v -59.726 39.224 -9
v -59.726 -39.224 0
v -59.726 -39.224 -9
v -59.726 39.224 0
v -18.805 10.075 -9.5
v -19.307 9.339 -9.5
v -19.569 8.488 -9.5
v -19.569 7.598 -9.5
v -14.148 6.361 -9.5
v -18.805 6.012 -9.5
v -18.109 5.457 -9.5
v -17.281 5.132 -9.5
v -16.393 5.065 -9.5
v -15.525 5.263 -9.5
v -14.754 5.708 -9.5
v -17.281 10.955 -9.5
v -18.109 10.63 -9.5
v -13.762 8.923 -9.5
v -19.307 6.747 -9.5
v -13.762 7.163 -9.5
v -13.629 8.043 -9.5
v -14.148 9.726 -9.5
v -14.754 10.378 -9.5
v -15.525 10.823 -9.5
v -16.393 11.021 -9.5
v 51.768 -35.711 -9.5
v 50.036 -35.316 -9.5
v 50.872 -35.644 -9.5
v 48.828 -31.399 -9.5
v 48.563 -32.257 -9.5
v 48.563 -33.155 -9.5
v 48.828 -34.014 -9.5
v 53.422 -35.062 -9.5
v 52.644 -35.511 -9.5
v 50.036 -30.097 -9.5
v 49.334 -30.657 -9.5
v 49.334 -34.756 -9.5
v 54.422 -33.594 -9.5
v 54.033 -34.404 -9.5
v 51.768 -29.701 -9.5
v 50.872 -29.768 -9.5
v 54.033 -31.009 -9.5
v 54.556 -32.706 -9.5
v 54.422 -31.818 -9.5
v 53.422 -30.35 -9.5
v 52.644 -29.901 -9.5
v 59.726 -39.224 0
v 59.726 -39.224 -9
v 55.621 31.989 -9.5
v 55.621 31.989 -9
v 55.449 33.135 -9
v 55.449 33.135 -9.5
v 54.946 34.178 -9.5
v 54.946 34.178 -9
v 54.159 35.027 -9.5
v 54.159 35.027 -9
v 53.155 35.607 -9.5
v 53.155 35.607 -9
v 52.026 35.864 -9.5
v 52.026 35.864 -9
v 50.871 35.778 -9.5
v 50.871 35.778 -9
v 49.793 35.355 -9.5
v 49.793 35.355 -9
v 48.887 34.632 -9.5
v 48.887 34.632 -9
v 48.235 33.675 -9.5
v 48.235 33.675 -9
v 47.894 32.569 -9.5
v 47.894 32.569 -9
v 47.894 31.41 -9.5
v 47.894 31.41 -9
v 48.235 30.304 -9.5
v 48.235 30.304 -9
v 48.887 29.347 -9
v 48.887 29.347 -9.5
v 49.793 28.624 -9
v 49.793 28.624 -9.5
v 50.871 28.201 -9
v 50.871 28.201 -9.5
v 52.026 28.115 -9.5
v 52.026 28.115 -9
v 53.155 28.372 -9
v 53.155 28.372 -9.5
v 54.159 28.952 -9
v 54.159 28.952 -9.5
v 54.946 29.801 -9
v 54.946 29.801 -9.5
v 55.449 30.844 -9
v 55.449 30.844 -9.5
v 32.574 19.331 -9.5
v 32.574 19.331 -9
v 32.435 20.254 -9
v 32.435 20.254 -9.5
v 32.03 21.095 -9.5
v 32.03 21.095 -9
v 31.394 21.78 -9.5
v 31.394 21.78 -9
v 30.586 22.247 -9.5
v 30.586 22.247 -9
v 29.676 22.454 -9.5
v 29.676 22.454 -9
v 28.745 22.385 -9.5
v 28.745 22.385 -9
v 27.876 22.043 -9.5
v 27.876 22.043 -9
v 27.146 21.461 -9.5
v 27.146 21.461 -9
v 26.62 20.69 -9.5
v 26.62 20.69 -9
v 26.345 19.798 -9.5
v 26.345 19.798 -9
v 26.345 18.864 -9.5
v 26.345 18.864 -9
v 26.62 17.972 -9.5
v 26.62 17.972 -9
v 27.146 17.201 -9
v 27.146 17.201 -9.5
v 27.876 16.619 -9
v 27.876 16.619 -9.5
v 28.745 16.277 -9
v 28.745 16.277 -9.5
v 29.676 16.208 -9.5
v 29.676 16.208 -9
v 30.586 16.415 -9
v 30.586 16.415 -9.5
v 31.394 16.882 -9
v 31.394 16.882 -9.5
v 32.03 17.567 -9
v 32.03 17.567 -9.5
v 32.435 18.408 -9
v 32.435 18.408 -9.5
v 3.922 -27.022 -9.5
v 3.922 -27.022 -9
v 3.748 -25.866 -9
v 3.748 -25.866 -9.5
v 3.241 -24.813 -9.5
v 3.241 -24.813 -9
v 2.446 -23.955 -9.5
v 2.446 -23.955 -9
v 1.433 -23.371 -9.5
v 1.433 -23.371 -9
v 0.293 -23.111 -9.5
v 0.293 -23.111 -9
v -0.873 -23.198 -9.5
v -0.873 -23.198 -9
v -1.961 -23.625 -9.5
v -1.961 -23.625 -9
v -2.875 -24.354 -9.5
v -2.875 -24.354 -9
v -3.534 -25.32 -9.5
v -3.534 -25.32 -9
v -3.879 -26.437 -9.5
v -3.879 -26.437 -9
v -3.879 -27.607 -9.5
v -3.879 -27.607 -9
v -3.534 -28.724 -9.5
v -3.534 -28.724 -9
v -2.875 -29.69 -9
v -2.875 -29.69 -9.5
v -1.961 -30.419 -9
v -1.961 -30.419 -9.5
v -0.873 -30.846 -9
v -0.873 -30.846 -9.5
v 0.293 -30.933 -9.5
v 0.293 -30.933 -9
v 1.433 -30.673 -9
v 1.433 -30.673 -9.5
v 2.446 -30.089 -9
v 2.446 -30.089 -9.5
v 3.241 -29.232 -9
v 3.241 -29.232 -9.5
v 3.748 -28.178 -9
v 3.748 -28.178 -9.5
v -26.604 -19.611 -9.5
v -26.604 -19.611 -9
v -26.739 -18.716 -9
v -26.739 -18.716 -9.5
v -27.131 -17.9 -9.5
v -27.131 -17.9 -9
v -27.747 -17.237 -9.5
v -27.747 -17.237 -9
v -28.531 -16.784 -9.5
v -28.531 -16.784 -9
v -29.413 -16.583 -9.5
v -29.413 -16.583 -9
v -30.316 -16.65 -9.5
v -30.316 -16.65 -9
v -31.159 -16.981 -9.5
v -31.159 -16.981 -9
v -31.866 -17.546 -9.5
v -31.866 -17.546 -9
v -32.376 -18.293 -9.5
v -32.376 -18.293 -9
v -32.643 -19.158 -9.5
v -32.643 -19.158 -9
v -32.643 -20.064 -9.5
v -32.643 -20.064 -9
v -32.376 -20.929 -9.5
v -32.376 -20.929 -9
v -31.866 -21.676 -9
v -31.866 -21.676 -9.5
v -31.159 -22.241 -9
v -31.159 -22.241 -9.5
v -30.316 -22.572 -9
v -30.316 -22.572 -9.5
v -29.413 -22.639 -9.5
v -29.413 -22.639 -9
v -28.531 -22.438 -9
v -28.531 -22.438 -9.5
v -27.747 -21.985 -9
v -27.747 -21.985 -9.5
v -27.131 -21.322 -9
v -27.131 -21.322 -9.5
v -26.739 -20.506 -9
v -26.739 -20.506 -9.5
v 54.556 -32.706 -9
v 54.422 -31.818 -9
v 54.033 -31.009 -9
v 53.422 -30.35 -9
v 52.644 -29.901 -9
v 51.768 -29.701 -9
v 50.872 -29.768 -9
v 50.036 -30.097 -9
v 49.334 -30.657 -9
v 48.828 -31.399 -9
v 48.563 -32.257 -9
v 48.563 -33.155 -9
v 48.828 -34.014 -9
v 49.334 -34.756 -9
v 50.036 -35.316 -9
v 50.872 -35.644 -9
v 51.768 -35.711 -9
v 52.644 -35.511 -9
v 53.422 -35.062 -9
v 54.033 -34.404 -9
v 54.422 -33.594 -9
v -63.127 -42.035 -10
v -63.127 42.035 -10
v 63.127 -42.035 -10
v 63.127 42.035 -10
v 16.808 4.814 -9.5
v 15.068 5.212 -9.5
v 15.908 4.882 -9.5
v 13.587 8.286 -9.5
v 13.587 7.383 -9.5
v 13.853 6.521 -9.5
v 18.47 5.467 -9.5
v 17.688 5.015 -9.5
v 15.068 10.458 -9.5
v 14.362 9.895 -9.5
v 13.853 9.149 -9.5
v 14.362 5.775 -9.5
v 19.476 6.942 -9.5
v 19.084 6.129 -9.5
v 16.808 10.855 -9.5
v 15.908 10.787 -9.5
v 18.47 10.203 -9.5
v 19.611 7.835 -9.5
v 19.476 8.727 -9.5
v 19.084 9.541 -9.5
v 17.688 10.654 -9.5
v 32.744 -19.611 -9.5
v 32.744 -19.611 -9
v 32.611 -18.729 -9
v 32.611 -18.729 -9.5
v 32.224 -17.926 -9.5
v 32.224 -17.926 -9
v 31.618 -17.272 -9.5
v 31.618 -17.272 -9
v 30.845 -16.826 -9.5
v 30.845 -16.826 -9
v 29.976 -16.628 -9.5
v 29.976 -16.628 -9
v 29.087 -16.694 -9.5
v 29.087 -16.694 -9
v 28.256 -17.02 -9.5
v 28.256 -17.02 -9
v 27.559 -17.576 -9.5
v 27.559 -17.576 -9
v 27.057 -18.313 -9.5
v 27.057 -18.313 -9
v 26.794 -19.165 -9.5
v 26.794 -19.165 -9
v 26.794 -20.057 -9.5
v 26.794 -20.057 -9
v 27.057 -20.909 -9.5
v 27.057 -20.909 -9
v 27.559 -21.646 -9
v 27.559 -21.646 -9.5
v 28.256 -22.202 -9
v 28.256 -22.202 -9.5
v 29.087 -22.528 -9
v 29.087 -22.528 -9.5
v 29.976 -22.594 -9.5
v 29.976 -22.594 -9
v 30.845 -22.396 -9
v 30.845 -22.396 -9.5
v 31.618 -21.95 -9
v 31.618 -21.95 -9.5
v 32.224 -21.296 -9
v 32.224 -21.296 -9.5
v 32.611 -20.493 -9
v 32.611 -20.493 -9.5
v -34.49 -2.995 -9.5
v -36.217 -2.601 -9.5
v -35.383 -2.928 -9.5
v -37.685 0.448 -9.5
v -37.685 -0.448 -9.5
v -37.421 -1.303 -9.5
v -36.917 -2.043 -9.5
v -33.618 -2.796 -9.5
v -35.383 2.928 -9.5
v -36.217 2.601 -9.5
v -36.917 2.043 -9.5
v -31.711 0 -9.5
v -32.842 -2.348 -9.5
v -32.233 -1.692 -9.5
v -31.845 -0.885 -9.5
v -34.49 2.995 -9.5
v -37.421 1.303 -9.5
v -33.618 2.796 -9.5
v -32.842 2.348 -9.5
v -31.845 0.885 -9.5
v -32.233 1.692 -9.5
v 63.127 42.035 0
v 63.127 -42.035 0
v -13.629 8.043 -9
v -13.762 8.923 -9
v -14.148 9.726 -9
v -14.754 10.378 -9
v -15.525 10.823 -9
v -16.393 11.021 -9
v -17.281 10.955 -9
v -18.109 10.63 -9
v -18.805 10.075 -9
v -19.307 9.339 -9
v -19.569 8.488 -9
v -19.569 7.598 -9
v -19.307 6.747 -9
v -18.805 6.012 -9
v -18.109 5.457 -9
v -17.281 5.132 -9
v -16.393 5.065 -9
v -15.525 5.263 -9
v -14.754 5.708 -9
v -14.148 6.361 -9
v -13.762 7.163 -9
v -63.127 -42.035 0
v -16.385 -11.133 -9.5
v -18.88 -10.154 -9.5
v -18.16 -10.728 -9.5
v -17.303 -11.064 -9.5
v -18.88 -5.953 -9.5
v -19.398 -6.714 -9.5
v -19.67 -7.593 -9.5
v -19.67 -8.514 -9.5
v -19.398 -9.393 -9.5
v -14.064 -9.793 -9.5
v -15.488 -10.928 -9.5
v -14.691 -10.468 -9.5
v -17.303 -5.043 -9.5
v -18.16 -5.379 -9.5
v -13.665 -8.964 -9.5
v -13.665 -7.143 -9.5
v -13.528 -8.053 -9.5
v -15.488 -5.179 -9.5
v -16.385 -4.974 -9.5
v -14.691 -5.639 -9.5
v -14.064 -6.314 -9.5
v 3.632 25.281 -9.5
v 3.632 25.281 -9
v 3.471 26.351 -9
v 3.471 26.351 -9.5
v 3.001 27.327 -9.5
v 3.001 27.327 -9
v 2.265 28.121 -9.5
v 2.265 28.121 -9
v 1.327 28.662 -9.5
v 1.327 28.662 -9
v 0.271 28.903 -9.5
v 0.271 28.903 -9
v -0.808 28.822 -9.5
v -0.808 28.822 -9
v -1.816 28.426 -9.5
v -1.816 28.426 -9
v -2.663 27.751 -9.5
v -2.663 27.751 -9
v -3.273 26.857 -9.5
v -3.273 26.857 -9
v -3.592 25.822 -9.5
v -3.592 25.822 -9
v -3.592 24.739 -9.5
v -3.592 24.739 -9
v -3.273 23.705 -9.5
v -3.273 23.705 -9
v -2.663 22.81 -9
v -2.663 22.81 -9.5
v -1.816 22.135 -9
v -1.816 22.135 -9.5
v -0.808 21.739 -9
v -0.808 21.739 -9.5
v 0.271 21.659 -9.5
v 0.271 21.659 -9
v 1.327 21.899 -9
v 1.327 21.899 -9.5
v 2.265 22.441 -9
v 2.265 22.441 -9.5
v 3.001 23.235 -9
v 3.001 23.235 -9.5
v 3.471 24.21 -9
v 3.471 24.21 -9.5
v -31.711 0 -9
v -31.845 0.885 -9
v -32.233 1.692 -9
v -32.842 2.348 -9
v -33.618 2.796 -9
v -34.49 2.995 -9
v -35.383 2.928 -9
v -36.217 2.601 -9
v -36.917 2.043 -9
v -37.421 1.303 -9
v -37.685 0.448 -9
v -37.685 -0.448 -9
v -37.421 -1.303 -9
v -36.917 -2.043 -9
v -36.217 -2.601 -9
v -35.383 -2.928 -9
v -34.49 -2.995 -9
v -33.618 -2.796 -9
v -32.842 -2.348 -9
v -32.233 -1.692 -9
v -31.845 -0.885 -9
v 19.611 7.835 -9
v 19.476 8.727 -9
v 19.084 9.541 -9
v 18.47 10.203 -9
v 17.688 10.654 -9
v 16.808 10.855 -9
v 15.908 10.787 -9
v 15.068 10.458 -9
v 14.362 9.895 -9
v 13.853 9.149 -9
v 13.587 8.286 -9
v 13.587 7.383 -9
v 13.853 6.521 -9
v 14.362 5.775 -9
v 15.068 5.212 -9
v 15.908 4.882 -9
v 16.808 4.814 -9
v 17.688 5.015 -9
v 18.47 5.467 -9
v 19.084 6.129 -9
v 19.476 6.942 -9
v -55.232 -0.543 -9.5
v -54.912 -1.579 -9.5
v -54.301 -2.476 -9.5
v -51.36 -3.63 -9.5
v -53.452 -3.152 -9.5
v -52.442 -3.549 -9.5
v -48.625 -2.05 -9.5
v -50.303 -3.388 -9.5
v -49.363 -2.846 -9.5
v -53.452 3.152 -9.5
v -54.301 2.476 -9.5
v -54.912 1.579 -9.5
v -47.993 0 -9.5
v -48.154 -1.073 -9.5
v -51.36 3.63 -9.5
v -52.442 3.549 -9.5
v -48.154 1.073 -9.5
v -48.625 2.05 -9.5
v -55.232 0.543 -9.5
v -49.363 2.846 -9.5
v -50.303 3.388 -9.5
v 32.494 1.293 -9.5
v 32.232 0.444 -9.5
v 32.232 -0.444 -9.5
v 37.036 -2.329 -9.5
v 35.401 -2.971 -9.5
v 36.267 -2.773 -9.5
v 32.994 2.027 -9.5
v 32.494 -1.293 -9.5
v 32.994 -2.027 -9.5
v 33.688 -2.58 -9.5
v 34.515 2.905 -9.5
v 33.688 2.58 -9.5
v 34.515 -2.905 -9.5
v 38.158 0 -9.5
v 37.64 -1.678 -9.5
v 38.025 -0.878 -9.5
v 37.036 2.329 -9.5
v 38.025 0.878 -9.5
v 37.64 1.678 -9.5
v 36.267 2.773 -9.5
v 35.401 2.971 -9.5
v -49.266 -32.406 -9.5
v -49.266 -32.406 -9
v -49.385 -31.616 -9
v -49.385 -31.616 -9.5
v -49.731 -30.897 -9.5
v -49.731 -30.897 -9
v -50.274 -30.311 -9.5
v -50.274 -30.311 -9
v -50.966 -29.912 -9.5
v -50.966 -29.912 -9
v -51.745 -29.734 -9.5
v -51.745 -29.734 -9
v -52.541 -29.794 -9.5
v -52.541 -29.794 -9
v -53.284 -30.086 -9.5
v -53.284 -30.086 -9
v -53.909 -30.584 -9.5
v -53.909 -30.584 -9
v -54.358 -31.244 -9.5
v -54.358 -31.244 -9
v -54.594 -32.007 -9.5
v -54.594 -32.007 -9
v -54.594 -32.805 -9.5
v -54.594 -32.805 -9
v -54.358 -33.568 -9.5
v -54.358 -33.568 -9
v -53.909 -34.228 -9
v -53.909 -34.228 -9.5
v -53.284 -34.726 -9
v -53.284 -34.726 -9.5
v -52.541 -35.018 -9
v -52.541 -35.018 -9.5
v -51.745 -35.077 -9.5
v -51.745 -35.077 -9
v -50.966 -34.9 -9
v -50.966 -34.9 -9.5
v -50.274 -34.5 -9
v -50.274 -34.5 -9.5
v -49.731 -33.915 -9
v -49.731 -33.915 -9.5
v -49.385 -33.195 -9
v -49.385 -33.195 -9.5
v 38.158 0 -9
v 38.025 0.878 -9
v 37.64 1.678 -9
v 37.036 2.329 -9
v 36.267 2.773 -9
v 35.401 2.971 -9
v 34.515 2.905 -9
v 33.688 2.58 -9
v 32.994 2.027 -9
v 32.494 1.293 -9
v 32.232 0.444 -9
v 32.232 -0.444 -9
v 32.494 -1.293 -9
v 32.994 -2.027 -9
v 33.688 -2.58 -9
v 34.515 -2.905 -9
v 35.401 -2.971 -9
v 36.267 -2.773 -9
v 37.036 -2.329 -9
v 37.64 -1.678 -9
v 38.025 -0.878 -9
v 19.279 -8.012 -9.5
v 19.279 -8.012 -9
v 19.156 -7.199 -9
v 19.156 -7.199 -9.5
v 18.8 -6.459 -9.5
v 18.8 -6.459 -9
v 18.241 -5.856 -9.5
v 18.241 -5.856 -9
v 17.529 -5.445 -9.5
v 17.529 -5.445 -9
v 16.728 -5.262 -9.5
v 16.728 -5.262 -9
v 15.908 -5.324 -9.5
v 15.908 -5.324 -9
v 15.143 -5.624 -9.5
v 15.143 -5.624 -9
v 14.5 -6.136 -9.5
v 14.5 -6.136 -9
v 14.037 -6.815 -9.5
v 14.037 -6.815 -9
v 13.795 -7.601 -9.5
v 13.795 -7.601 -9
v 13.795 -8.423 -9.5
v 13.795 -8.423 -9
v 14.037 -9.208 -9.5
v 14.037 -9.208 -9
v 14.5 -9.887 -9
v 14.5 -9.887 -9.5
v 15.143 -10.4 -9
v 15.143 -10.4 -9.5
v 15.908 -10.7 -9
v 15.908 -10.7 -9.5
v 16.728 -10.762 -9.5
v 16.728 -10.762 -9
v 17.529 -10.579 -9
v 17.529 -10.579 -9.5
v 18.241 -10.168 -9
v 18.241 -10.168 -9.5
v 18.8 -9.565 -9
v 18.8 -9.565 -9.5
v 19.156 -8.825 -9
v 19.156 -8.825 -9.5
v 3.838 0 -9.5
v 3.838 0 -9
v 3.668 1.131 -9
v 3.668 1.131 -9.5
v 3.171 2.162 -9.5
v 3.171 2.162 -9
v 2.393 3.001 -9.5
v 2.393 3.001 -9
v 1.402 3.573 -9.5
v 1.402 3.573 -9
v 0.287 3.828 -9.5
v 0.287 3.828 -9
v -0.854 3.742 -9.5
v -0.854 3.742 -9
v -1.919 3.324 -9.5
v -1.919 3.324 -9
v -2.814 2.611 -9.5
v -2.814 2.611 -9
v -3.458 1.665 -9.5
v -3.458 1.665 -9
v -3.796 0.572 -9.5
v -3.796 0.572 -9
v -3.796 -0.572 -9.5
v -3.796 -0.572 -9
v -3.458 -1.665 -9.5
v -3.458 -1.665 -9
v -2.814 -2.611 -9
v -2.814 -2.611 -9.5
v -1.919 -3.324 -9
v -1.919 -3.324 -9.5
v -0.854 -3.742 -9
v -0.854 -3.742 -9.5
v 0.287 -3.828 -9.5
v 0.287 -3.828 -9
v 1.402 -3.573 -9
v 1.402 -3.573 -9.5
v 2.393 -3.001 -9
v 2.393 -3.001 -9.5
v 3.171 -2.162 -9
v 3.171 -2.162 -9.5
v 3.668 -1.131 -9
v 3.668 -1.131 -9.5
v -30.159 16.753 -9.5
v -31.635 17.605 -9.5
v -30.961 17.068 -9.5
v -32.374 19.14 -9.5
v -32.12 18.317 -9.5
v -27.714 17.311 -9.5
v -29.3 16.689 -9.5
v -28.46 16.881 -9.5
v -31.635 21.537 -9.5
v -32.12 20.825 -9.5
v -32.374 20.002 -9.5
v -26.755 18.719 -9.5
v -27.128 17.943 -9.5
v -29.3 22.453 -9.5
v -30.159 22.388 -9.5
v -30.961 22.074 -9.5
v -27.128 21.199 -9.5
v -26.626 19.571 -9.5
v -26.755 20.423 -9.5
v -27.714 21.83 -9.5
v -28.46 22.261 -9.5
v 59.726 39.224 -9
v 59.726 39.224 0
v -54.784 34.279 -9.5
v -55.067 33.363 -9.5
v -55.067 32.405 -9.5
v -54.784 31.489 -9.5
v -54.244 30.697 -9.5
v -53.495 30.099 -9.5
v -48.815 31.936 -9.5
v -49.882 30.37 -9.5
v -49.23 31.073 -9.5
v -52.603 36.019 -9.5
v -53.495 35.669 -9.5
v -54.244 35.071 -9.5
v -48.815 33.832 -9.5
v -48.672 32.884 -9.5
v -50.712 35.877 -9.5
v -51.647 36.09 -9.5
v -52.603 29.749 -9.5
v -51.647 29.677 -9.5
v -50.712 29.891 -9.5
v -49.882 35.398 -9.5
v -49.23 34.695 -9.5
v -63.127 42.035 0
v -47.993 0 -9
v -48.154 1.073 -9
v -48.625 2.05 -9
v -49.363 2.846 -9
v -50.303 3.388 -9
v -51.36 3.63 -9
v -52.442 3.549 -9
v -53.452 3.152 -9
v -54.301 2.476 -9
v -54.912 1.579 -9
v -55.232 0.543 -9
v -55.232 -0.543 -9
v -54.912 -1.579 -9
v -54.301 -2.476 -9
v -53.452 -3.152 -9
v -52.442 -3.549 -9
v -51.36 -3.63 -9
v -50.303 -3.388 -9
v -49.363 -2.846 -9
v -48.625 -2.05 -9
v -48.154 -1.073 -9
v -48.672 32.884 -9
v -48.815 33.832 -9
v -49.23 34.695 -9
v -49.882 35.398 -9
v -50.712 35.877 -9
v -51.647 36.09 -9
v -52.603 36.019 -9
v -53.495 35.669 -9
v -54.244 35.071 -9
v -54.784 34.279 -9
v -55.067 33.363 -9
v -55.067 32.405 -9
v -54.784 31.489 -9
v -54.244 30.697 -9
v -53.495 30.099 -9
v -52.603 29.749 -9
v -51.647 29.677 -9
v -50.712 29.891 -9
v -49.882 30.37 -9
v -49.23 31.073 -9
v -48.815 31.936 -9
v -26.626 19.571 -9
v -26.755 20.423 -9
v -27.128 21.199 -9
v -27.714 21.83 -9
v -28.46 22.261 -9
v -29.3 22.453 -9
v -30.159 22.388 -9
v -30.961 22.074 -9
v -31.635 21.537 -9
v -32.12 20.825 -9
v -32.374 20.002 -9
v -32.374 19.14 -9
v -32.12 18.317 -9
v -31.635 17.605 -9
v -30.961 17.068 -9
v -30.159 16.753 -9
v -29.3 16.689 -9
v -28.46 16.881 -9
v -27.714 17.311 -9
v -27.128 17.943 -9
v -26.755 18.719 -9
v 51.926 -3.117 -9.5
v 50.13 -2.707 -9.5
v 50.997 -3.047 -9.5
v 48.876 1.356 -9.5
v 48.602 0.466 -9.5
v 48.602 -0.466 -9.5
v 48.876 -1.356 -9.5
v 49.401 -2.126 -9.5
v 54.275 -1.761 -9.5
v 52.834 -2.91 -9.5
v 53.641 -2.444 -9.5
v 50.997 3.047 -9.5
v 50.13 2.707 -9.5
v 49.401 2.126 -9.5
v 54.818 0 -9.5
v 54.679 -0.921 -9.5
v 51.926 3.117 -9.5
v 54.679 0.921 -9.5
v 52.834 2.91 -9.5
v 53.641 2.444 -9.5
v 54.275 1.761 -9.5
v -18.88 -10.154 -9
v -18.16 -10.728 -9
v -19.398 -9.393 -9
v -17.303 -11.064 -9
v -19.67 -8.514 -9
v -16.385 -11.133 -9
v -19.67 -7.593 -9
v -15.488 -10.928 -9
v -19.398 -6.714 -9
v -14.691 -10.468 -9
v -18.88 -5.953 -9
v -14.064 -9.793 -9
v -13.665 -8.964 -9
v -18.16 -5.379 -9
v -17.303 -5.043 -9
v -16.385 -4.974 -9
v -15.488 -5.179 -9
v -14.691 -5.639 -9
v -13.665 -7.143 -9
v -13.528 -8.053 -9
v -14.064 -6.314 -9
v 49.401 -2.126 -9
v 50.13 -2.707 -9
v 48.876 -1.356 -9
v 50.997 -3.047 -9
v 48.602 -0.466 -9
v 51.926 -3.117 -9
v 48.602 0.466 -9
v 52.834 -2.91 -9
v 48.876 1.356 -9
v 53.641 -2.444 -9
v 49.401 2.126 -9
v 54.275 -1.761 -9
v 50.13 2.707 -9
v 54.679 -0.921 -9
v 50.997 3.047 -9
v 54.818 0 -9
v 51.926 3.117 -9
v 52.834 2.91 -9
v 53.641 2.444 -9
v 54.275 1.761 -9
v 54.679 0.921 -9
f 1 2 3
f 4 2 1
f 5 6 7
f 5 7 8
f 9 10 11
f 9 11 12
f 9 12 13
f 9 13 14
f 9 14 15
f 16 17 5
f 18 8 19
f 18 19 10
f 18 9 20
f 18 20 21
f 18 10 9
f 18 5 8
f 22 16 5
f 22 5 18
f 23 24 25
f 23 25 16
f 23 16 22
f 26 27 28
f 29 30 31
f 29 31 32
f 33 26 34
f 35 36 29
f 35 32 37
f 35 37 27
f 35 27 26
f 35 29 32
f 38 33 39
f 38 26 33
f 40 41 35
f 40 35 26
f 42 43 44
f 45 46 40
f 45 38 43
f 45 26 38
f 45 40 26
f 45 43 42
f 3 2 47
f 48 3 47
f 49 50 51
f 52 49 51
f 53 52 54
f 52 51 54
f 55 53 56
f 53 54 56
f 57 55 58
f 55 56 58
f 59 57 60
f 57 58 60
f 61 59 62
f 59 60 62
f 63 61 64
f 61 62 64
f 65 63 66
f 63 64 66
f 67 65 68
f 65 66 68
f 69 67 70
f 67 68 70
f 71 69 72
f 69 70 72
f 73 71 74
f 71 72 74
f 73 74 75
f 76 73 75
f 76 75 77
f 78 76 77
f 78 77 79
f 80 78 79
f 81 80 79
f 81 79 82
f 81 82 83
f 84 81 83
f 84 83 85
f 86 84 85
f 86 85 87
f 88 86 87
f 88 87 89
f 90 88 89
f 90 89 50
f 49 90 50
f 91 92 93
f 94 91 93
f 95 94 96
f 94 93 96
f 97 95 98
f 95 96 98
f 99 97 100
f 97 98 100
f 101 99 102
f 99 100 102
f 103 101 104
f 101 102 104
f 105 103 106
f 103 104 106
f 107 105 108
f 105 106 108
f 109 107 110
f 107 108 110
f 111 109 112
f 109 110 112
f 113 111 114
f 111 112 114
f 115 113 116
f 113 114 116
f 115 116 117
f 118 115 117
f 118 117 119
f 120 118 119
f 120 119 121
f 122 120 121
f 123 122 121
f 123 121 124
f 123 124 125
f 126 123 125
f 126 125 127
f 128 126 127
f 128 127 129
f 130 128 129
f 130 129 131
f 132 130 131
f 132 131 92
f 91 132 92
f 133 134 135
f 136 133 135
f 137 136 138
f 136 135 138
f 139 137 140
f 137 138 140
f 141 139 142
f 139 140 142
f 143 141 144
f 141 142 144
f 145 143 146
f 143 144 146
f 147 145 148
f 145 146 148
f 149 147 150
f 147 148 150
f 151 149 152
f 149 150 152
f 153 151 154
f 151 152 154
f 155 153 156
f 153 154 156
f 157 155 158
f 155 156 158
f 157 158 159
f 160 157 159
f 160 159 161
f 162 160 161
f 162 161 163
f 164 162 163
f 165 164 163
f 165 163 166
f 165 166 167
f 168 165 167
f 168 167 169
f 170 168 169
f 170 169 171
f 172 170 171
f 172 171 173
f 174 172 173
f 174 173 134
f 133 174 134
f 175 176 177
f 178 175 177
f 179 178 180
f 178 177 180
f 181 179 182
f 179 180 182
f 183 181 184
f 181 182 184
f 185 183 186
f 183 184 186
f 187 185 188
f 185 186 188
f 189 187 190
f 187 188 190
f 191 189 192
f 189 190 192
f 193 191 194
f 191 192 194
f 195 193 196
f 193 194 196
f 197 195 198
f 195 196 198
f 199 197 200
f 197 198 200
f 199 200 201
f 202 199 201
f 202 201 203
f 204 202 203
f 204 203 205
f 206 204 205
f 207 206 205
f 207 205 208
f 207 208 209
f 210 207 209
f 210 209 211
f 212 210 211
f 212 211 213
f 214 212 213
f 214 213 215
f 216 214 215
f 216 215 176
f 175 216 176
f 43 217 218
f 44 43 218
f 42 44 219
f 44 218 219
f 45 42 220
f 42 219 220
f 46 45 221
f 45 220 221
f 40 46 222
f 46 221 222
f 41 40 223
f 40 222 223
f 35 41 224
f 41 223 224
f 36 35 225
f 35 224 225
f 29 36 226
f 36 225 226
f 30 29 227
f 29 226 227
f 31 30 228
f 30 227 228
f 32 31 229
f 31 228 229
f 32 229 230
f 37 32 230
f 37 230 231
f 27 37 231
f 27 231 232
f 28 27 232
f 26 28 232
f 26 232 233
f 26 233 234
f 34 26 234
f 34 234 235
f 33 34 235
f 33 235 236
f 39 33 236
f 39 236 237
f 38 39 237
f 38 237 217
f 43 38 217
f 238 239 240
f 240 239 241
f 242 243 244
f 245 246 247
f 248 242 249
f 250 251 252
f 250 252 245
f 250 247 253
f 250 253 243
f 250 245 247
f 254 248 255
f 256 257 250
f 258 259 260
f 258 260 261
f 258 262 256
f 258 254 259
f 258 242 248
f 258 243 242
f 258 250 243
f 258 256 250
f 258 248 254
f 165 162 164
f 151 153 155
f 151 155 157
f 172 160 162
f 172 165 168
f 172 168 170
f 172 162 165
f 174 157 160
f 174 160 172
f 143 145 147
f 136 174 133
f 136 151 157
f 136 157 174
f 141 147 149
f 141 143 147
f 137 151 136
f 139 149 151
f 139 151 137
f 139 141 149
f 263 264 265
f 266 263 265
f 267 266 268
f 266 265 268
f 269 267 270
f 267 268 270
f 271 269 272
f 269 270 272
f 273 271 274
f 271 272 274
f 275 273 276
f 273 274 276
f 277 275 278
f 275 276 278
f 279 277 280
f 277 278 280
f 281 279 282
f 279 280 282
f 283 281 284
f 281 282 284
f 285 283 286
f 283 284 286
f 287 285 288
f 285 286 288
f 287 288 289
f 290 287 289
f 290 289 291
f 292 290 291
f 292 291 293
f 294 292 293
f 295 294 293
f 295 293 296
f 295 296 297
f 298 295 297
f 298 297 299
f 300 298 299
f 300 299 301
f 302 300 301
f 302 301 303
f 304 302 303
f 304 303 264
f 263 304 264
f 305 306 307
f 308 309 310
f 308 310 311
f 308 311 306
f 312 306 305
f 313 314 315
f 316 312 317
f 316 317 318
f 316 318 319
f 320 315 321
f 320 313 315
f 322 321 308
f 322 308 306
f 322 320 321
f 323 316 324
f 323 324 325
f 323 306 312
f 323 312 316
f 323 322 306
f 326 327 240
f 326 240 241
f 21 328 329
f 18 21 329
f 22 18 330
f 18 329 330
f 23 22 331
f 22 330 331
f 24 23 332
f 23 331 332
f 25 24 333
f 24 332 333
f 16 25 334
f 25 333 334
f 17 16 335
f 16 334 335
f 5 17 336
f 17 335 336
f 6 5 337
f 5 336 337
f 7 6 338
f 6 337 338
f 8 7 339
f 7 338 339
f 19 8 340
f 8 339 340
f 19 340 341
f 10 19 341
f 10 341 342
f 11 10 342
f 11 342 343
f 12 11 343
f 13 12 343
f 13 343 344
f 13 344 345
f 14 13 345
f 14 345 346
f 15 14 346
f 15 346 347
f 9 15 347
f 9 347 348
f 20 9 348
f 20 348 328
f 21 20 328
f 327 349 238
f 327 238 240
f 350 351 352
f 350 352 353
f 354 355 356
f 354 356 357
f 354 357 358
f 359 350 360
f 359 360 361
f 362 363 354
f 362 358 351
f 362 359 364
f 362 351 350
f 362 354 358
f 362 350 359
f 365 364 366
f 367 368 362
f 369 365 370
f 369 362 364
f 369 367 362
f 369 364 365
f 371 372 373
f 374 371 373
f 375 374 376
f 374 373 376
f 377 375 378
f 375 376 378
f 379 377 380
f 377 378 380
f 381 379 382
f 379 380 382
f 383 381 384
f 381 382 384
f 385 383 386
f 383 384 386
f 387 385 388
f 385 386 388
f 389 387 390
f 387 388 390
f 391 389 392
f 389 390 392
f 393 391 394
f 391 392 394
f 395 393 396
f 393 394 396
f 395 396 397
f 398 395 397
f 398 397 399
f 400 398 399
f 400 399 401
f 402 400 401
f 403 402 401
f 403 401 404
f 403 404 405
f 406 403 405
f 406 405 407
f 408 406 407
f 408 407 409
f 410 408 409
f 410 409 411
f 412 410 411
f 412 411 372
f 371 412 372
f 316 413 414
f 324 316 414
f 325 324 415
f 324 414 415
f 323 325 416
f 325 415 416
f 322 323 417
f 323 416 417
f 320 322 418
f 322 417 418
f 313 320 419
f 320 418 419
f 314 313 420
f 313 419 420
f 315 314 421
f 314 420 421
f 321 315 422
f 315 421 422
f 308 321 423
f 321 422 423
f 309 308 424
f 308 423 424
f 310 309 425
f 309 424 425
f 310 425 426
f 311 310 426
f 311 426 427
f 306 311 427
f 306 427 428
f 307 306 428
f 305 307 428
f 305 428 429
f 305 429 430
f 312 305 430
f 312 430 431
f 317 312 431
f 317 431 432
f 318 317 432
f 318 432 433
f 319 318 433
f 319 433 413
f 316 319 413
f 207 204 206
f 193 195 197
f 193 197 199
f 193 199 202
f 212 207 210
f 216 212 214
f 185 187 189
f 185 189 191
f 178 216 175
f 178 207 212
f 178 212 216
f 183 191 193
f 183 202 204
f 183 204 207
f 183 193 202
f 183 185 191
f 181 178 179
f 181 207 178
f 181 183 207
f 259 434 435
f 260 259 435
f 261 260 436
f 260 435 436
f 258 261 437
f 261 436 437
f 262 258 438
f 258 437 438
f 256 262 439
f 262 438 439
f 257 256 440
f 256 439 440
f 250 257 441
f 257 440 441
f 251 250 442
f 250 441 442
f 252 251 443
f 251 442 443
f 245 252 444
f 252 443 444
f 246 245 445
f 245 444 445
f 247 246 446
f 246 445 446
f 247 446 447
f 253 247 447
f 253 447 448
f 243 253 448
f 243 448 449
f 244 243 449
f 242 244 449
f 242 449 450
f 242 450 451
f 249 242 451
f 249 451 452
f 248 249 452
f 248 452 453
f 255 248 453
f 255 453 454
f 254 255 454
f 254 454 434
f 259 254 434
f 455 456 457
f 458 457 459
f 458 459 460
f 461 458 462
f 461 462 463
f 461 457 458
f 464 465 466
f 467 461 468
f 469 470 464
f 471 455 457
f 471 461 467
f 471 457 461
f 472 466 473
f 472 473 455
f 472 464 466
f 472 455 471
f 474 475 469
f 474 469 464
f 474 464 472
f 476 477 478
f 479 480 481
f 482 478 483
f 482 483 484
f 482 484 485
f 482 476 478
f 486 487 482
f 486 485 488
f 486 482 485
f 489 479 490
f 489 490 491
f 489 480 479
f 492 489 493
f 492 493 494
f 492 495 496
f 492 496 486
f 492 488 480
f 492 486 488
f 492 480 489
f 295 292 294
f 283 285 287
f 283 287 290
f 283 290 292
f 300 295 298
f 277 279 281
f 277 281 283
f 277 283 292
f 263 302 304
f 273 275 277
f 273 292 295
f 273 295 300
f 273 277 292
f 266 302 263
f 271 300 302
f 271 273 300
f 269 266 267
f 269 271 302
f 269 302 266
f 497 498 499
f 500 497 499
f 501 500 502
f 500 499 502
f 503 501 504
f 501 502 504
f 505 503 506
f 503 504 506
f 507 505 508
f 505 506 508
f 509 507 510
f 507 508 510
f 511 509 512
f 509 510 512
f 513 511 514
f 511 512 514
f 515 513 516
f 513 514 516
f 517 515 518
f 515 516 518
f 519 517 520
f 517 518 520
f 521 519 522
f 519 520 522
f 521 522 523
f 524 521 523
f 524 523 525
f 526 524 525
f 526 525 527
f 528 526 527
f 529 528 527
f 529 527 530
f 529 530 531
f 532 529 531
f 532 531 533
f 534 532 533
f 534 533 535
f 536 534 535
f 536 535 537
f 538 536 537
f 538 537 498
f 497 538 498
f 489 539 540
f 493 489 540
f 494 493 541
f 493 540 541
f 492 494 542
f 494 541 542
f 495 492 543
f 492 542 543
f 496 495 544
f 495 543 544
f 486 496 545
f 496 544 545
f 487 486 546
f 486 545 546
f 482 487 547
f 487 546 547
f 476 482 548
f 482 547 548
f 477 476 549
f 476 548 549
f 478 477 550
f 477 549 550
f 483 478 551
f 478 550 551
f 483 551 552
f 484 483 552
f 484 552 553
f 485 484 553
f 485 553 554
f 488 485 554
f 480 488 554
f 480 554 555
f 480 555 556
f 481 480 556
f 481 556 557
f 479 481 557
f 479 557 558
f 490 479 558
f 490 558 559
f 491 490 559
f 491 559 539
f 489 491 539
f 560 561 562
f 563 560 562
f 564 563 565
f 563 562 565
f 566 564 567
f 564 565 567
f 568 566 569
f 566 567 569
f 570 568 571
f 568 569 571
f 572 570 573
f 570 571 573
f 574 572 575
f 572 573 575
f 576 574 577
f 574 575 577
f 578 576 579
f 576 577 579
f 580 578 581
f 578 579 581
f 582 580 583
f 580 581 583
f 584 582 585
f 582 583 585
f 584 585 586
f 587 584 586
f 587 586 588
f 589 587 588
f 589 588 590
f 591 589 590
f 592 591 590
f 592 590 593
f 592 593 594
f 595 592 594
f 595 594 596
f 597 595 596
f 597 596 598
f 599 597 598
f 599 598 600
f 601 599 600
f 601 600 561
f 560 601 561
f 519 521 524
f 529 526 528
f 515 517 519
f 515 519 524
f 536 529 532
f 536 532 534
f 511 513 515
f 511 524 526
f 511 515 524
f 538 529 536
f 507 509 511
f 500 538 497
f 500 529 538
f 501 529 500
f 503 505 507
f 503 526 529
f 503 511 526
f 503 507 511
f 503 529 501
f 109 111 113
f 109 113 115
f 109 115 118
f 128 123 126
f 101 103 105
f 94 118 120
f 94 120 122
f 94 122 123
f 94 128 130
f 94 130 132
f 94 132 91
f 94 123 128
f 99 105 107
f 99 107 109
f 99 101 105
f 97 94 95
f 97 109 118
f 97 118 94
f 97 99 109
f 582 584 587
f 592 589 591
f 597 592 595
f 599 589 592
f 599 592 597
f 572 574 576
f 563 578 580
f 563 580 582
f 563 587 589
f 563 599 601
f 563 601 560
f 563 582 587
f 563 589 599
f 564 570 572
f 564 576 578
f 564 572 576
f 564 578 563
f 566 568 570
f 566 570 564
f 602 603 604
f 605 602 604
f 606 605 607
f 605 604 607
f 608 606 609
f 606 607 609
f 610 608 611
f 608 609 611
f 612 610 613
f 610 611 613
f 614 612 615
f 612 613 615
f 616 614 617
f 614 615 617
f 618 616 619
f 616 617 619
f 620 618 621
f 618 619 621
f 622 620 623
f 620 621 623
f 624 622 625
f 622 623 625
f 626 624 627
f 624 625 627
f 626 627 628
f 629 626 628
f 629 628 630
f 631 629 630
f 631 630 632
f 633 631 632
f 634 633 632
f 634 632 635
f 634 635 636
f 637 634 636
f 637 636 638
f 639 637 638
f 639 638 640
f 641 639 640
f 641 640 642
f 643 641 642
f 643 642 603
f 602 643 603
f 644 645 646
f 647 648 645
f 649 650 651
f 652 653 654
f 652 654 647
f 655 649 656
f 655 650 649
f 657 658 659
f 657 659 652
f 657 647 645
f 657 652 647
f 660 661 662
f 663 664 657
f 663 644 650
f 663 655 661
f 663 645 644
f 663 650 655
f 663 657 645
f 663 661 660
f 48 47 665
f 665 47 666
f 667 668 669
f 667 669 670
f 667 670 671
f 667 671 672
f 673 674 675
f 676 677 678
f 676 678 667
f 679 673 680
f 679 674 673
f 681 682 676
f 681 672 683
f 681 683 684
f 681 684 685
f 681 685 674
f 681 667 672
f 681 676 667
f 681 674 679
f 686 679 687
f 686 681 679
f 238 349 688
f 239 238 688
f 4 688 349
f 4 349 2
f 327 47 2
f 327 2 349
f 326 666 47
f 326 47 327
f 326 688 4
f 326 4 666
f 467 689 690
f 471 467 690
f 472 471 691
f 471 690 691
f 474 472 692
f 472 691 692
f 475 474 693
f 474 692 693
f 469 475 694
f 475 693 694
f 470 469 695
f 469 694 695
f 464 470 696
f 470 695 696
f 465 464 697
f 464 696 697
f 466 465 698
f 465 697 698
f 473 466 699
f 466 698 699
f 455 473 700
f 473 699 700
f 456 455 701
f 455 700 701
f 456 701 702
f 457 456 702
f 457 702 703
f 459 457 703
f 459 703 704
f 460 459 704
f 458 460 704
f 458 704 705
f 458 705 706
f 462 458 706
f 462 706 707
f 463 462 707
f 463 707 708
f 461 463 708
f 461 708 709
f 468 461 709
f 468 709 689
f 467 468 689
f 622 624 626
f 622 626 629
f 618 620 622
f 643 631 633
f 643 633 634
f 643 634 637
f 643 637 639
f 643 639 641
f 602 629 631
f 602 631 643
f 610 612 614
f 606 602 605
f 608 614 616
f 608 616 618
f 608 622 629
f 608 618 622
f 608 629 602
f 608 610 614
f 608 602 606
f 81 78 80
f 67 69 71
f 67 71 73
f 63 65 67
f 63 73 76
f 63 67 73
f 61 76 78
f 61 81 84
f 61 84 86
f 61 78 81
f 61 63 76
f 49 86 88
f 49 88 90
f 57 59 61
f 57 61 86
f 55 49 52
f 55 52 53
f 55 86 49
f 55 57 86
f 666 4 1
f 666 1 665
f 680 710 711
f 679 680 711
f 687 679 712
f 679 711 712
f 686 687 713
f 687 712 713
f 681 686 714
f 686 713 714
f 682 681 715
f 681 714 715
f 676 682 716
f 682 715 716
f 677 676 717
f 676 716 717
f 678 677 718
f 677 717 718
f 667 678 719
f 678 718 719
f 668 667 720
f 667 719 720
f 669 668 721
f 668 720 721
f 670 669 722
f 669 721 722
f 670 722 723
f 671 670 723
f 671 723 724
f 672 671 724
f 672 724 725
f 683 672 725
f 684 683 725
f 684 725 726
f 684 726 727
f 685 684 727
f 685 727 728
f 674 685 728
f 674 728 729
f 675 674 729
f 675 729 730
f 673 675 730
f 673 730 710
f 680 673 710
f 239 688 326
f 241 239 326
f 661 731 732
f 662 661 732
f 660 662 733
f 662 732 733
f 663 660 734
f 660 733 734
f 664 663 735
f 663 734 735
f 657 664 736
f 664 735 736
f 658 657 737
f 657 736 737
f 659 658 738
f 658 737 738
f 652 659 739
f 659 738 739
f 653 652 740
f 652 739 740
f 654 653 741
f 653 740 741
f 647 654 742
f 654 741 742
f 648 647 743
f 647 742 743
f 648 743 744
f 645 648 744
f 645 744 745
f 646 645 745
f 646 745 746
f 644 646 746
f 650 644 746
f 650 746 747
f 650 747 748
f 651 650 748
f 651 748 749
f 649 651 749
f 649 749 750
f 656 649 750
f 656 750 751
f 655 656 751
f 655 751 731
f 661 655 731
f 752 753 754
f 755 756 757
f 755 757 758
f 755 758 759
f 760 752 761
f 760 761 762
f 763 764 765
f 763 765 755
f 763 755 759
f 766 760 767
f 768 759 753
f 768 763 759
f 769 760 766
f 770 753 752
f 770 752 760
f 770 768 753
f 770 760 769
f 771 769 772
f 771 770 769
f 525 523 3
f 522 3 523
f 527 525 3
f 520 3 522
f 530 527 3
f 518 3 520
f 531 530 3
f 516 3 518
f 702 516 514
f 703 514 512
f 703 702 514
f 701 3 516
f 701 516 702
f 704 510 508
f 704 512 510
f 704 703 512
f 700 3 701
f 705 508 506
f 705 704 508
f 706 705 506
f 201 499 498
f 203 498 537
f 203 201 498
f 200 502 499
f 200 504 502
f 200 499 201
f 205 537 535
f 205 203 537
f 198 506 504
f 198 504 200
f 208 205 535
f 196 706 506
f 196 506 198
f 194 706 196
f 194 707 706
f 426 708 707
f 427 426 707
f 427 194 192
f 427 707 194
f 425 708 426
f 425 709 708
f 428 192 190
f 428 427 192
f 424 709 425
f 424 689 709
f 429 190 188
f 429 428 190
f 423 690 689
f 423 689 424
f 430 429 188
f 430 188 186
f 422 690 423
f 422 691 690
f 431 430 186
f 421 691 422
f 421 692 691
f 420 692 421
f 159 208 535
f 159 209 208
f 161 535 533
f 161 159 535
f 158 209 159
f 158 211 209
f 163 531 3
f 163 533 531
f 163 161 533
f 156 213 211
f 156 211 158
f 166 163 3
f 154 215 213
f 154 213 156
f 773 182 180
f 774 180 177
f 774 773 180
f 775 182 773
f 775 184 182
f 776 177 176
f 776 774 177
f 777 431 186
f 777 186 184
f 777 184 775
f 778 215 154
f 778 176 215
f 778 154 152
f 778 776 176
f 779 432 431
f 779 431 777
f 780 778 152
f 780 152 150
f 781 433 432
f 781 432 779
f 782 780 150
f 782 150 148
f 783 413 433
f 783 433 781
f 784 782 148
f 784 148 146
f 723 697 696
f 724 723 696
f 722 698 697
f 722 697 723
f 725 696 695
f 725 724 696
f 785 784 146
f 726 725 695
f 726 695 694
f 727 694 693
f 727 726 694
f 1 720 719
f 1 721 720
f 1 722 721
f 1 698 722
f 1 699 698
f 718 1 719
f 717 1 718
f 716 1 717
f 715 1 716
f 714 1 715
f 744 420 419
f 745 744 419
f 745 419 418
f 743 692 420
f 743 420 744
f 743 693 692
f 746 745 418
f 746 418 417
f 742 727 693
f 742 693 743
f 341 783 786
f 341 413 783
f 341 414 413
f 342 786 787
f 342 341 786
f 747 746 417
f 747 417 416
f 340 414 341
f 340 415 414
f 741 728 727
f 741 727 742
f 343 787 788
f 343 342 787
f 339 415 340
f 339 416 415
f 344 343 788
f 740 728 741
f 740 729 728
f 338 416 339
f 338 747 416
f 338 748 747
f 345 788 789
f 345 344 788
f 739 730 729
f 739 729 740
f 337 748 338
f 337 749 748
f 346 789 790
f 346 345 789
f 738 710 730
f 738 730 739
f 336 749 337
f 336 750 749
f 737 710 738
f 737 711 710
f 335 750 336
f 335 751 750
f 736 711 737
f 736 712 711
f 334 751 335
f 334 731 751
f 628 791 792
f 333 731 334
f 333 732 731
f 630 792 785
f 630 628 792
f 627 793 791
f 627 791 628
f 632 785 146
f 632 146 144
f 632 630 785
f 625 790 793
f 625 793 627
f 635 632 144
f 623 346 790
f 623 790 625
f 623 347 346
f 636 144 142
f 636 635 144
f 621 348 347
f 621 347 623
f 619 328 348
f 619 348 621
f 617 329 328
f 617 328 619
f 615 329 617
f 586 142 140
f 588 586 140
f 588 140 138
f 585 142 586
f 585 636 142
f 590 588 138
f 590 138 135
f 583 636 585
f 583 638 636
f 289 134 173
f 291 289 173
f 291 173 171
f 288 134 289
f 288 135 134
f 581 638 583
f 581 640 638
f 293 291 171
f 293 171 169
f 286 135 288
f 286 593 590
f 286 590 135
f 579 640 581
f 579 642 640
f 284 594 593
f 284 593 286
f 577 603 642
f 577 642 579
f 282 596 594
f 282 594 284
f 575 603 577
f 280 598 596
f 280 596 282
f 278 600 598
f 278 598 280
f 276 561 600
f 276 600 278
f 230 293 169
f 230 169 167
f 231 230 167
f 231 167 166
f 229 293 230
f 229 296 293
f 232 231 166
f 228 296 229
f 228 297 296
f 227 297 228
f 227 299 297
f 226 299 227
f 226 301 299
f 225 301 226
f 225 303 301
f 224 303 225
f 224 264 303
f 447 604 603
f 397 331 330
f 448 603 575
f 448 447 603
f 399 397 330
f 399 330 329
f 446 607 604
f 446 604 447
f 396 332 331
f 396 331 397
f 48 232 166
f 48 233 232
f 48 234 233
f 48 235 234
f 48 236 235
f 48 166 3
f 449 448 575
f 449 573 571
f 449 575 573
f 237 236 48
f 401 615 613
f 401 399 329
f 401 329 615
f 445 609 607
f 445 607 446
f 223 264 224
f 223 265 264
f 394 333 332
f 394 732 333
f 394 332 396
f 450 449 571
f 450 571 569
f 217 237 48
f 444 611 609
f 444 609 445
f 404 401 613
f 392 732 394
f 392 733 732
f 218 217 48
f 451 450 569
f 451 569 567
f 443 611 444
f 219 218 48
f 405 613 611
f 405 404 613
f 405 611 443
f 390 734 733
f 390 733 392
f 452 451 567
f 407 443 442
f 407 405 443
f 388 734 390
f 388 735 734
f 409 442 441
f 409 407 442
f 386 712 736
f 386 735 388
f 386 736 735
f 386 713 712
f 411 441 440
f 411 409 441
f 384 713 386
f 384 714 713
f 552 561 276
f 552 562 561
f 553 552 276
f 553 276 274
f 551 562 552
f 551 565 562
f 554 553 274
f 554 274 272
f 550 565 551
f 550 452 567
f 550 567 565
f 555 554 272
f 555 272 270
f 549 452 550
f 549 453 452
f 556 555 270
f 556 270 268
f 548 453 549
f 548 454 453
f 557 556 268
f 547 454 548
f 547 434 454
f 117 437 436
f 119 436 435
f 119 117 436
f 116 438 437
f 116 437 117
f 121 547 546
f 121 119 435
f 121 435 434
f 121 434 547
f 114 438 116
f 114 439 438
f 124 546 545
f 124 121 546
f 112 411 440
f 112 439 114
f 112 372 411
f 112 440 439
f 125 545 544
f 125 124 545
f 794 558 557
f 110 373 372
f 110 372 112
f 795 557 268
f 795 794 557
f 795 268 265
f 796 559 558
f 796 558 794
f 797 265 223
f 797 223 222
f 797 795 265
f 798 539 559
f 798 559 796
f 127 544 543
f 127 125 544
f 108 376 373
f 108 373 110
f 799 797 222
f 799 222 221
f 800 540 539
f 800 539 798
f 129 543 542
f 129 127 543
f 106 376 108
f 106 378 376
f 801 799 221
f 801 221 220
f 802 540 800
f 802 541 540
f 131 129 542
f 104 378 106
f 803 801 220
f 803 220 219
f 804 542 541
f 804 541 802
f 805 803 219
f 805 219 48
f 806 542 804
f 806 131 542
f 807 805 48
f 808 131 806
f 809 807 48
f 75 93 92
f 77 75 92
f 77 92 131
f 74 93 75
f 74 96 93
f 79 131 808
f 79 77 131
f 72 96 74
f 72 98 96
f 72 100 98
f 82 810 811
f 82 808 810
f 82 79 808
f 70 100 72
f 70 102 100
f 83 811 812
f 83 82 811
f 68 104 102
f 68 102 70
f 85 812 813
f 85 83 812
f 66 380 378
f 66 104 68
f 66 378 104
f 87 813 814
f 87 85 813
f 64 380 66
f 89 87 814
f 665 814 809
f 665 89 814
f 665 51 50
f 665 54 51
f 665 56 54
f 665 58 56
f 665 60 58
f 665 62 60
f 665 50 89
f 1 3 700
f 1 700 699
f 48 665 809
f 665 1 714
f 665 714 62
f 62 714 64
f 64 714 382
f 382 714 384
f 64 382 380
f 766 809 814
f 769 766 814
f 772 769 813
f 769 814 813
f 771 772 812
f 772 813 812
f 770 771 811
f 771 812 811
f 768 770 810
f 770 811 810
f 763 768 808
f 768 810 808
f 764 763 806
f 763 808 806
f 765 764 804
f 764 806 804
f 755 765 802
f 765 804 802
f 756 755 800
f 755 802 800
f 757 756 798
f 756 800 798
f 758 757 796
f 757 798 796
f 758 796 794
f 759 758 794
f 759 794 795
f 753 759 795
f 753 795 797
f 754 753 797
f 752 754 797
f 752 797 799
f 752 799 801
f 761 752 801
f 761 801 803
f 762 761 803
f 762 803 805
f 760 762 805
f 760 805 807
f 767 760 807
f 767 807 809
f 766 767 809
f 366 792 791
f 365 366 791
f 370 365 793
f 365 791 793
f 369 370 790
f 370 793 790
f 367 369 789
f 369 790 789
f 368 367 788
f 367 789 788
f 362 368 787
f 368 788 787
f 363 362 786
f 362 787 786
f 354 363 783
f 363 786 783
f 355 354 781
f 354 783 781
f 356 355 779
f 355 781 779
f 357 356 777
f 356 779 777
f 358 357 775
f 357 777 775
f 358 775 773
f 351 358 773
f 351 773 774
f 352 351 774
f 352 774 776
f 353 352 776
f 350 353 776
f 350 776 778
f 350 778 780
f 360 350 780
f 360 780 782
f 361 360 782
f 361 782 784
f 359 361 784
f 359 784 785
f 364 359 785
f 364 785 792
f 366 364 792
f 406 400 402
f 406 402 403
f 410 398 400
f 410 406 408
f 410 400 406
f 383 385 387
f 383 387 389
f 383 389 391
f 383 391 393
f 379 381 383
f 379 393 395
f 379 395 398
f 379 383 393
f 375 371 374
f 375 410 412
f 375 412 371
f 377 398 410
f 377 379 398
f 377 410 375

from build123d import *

# Parameters (mm, degrees)
F0_W      = 126.2549012899
F0_H      = 84.0705931187
F1_DEPTH  = 10
F2_W      = 119.4519400597
F2_H      = 78.4470066428
F3_DEPTH  = 9
F6_R      = 2.7574274492
F6_R_2    = 3.0881184617
F6_R_3    = 2.9865161703
F7_DEPTH  = 9.5
F5_R      = 3.0287162896
F8_DEPTH  = 9.5
F4_R      = 3.8384708655
F9_DEPTH  = 9.5
F10_R     = 3.132111717
F10_R_2   = 2.9916448853
F10_R_3   = 3.0367007185
F10_R_4   = 2.8900379759
F11_DEPTH = 9.5
F13_R     = 3.0036385534
F13_R_2   = 2.9794176667
F13_R_3   = 3.6399459422
F13_R_4   = 3.1255773117
F14_DEPTH = 9.5
F12_R     = 3.2154485225
F12_R_2   = 2.6789056155
F12_R_3   = 3.0133824395
F12_R_4   = 3.8856724273
F15_DEPTH = 9.5
F16_R     = 3.6323450942
F16_R_2   = 3.9223279678
F17_DEPTH = 9.5


# Not quite as in the source:
# - a feature names something its author has since deleted; it is built from what else it names


with BuildPart() as f1:
    # F0 (on Top) → F1 (new body)
    with BuildSketch(Plane.XY):
        Rectangle(F0_W, F0_H)
    extrude(amount=-F1_DEPTH)

    # F2 (on Top) → F3 (cut)
    with BuildSketch(Plane.XY):
        Rectangle(F2_W, F2_H)
    extrude(amount=-F3_DEPTH, mode=Mode.SUBTRACT)

    # F6 (on Top) → F7 (cut)
    with BuildSketch(Plane.XY):
        with Locations((16.5214389563, -8.0118775368)):
            Circle(F6_R)
        with Locations((-16.615998, -8.0534629524)):
            Circle(F6_R_2)
        with Locations((-16.615998, 8.0431699753)):
            Circle(F6_R_3)
    extrude(amount=-F7_DEPTH, mode=Mode.SUBTRACT)

    # F5 (on Top) → F8 (cut)
    with BuildSketch(Plane.XY):
        with Locations((16.5819376707, 7.8347064555)):
            Circle(F5_R)
    extrude(amount=-F8_DEPTH, mode=Mode.SUBTRACT)

    # F4 (on Top) → F9 (cut)
    with BuildSketch(Plane.XY):
        Circle(F4_R)
    extrude(amount=-F9_DEPTH, mode=Mode.SUBTRACT)

    # F10 (on face) → F11 (cut)
    with BuildSketch(Plane.XY):
        with Locations((29.441639781, 19.3310081959)):
            Circle(F10_R)
        with Locations((29.7522768378, -19.6110159159)):
            Circle(F10_R_2)
        with Locations((-29.6404287219, -19.6110159159)):
            Circle(F10_R_3)
        with Locations((-29.5161753893, 19.5709131658)):
            Circle(F10_R_4)
    extrude(amount=-F11_DEPTH, mode=Mode.SUBTRACT)

    # F13 (on Top) → F14 (cut)
    with BuildSketch(Plane.XY):
        with Locations((-34.714885056, 0)):
            Circle(F13_R)
        with Locations((35.1781696081, 0)):
            Circle(F13_R_2)
        with Locations((-51.6325049102, 0)):
            Circle(F13_R_3)
        with Locations((51.6923218966, 0)):
            Circle(F13_R_4)
    extrude(amount=-F14_DEPTH, mode=Mode.SUBTRACT)

    # F12 (on Top) → F15 (cut)
    with BuildSketch(Plane.XY):
        with Locations((-51.8871918321, 32.8838564456)):
            Circle(F12_R)
        with Locations((-51.9447661936, -32.4058681726)):
            Circle(F12_R_2)
        with Locations((51.5429228544, -32.7062048018)):
            Circle(F12_R_3)
        with Locations((51.7358258367, 31.9894589484)):
            Circle(F12_R_4)
    extrude(amount=-F15_DEPTH, mode=Mode.SUBTRACT)

    # F16 (on Top) → F17 (cut)
    with BuildSketch(Plane.XY):
        with Locations((0, 25.2807121724)):
            Circle(F16_R)
        with Locations((0, -27.0220451057)):
            Circle(F16_R_2)
    extrude(amount=-F17_DEPTH, mode=Mode.SUBTRACT)


solid = f1.part
